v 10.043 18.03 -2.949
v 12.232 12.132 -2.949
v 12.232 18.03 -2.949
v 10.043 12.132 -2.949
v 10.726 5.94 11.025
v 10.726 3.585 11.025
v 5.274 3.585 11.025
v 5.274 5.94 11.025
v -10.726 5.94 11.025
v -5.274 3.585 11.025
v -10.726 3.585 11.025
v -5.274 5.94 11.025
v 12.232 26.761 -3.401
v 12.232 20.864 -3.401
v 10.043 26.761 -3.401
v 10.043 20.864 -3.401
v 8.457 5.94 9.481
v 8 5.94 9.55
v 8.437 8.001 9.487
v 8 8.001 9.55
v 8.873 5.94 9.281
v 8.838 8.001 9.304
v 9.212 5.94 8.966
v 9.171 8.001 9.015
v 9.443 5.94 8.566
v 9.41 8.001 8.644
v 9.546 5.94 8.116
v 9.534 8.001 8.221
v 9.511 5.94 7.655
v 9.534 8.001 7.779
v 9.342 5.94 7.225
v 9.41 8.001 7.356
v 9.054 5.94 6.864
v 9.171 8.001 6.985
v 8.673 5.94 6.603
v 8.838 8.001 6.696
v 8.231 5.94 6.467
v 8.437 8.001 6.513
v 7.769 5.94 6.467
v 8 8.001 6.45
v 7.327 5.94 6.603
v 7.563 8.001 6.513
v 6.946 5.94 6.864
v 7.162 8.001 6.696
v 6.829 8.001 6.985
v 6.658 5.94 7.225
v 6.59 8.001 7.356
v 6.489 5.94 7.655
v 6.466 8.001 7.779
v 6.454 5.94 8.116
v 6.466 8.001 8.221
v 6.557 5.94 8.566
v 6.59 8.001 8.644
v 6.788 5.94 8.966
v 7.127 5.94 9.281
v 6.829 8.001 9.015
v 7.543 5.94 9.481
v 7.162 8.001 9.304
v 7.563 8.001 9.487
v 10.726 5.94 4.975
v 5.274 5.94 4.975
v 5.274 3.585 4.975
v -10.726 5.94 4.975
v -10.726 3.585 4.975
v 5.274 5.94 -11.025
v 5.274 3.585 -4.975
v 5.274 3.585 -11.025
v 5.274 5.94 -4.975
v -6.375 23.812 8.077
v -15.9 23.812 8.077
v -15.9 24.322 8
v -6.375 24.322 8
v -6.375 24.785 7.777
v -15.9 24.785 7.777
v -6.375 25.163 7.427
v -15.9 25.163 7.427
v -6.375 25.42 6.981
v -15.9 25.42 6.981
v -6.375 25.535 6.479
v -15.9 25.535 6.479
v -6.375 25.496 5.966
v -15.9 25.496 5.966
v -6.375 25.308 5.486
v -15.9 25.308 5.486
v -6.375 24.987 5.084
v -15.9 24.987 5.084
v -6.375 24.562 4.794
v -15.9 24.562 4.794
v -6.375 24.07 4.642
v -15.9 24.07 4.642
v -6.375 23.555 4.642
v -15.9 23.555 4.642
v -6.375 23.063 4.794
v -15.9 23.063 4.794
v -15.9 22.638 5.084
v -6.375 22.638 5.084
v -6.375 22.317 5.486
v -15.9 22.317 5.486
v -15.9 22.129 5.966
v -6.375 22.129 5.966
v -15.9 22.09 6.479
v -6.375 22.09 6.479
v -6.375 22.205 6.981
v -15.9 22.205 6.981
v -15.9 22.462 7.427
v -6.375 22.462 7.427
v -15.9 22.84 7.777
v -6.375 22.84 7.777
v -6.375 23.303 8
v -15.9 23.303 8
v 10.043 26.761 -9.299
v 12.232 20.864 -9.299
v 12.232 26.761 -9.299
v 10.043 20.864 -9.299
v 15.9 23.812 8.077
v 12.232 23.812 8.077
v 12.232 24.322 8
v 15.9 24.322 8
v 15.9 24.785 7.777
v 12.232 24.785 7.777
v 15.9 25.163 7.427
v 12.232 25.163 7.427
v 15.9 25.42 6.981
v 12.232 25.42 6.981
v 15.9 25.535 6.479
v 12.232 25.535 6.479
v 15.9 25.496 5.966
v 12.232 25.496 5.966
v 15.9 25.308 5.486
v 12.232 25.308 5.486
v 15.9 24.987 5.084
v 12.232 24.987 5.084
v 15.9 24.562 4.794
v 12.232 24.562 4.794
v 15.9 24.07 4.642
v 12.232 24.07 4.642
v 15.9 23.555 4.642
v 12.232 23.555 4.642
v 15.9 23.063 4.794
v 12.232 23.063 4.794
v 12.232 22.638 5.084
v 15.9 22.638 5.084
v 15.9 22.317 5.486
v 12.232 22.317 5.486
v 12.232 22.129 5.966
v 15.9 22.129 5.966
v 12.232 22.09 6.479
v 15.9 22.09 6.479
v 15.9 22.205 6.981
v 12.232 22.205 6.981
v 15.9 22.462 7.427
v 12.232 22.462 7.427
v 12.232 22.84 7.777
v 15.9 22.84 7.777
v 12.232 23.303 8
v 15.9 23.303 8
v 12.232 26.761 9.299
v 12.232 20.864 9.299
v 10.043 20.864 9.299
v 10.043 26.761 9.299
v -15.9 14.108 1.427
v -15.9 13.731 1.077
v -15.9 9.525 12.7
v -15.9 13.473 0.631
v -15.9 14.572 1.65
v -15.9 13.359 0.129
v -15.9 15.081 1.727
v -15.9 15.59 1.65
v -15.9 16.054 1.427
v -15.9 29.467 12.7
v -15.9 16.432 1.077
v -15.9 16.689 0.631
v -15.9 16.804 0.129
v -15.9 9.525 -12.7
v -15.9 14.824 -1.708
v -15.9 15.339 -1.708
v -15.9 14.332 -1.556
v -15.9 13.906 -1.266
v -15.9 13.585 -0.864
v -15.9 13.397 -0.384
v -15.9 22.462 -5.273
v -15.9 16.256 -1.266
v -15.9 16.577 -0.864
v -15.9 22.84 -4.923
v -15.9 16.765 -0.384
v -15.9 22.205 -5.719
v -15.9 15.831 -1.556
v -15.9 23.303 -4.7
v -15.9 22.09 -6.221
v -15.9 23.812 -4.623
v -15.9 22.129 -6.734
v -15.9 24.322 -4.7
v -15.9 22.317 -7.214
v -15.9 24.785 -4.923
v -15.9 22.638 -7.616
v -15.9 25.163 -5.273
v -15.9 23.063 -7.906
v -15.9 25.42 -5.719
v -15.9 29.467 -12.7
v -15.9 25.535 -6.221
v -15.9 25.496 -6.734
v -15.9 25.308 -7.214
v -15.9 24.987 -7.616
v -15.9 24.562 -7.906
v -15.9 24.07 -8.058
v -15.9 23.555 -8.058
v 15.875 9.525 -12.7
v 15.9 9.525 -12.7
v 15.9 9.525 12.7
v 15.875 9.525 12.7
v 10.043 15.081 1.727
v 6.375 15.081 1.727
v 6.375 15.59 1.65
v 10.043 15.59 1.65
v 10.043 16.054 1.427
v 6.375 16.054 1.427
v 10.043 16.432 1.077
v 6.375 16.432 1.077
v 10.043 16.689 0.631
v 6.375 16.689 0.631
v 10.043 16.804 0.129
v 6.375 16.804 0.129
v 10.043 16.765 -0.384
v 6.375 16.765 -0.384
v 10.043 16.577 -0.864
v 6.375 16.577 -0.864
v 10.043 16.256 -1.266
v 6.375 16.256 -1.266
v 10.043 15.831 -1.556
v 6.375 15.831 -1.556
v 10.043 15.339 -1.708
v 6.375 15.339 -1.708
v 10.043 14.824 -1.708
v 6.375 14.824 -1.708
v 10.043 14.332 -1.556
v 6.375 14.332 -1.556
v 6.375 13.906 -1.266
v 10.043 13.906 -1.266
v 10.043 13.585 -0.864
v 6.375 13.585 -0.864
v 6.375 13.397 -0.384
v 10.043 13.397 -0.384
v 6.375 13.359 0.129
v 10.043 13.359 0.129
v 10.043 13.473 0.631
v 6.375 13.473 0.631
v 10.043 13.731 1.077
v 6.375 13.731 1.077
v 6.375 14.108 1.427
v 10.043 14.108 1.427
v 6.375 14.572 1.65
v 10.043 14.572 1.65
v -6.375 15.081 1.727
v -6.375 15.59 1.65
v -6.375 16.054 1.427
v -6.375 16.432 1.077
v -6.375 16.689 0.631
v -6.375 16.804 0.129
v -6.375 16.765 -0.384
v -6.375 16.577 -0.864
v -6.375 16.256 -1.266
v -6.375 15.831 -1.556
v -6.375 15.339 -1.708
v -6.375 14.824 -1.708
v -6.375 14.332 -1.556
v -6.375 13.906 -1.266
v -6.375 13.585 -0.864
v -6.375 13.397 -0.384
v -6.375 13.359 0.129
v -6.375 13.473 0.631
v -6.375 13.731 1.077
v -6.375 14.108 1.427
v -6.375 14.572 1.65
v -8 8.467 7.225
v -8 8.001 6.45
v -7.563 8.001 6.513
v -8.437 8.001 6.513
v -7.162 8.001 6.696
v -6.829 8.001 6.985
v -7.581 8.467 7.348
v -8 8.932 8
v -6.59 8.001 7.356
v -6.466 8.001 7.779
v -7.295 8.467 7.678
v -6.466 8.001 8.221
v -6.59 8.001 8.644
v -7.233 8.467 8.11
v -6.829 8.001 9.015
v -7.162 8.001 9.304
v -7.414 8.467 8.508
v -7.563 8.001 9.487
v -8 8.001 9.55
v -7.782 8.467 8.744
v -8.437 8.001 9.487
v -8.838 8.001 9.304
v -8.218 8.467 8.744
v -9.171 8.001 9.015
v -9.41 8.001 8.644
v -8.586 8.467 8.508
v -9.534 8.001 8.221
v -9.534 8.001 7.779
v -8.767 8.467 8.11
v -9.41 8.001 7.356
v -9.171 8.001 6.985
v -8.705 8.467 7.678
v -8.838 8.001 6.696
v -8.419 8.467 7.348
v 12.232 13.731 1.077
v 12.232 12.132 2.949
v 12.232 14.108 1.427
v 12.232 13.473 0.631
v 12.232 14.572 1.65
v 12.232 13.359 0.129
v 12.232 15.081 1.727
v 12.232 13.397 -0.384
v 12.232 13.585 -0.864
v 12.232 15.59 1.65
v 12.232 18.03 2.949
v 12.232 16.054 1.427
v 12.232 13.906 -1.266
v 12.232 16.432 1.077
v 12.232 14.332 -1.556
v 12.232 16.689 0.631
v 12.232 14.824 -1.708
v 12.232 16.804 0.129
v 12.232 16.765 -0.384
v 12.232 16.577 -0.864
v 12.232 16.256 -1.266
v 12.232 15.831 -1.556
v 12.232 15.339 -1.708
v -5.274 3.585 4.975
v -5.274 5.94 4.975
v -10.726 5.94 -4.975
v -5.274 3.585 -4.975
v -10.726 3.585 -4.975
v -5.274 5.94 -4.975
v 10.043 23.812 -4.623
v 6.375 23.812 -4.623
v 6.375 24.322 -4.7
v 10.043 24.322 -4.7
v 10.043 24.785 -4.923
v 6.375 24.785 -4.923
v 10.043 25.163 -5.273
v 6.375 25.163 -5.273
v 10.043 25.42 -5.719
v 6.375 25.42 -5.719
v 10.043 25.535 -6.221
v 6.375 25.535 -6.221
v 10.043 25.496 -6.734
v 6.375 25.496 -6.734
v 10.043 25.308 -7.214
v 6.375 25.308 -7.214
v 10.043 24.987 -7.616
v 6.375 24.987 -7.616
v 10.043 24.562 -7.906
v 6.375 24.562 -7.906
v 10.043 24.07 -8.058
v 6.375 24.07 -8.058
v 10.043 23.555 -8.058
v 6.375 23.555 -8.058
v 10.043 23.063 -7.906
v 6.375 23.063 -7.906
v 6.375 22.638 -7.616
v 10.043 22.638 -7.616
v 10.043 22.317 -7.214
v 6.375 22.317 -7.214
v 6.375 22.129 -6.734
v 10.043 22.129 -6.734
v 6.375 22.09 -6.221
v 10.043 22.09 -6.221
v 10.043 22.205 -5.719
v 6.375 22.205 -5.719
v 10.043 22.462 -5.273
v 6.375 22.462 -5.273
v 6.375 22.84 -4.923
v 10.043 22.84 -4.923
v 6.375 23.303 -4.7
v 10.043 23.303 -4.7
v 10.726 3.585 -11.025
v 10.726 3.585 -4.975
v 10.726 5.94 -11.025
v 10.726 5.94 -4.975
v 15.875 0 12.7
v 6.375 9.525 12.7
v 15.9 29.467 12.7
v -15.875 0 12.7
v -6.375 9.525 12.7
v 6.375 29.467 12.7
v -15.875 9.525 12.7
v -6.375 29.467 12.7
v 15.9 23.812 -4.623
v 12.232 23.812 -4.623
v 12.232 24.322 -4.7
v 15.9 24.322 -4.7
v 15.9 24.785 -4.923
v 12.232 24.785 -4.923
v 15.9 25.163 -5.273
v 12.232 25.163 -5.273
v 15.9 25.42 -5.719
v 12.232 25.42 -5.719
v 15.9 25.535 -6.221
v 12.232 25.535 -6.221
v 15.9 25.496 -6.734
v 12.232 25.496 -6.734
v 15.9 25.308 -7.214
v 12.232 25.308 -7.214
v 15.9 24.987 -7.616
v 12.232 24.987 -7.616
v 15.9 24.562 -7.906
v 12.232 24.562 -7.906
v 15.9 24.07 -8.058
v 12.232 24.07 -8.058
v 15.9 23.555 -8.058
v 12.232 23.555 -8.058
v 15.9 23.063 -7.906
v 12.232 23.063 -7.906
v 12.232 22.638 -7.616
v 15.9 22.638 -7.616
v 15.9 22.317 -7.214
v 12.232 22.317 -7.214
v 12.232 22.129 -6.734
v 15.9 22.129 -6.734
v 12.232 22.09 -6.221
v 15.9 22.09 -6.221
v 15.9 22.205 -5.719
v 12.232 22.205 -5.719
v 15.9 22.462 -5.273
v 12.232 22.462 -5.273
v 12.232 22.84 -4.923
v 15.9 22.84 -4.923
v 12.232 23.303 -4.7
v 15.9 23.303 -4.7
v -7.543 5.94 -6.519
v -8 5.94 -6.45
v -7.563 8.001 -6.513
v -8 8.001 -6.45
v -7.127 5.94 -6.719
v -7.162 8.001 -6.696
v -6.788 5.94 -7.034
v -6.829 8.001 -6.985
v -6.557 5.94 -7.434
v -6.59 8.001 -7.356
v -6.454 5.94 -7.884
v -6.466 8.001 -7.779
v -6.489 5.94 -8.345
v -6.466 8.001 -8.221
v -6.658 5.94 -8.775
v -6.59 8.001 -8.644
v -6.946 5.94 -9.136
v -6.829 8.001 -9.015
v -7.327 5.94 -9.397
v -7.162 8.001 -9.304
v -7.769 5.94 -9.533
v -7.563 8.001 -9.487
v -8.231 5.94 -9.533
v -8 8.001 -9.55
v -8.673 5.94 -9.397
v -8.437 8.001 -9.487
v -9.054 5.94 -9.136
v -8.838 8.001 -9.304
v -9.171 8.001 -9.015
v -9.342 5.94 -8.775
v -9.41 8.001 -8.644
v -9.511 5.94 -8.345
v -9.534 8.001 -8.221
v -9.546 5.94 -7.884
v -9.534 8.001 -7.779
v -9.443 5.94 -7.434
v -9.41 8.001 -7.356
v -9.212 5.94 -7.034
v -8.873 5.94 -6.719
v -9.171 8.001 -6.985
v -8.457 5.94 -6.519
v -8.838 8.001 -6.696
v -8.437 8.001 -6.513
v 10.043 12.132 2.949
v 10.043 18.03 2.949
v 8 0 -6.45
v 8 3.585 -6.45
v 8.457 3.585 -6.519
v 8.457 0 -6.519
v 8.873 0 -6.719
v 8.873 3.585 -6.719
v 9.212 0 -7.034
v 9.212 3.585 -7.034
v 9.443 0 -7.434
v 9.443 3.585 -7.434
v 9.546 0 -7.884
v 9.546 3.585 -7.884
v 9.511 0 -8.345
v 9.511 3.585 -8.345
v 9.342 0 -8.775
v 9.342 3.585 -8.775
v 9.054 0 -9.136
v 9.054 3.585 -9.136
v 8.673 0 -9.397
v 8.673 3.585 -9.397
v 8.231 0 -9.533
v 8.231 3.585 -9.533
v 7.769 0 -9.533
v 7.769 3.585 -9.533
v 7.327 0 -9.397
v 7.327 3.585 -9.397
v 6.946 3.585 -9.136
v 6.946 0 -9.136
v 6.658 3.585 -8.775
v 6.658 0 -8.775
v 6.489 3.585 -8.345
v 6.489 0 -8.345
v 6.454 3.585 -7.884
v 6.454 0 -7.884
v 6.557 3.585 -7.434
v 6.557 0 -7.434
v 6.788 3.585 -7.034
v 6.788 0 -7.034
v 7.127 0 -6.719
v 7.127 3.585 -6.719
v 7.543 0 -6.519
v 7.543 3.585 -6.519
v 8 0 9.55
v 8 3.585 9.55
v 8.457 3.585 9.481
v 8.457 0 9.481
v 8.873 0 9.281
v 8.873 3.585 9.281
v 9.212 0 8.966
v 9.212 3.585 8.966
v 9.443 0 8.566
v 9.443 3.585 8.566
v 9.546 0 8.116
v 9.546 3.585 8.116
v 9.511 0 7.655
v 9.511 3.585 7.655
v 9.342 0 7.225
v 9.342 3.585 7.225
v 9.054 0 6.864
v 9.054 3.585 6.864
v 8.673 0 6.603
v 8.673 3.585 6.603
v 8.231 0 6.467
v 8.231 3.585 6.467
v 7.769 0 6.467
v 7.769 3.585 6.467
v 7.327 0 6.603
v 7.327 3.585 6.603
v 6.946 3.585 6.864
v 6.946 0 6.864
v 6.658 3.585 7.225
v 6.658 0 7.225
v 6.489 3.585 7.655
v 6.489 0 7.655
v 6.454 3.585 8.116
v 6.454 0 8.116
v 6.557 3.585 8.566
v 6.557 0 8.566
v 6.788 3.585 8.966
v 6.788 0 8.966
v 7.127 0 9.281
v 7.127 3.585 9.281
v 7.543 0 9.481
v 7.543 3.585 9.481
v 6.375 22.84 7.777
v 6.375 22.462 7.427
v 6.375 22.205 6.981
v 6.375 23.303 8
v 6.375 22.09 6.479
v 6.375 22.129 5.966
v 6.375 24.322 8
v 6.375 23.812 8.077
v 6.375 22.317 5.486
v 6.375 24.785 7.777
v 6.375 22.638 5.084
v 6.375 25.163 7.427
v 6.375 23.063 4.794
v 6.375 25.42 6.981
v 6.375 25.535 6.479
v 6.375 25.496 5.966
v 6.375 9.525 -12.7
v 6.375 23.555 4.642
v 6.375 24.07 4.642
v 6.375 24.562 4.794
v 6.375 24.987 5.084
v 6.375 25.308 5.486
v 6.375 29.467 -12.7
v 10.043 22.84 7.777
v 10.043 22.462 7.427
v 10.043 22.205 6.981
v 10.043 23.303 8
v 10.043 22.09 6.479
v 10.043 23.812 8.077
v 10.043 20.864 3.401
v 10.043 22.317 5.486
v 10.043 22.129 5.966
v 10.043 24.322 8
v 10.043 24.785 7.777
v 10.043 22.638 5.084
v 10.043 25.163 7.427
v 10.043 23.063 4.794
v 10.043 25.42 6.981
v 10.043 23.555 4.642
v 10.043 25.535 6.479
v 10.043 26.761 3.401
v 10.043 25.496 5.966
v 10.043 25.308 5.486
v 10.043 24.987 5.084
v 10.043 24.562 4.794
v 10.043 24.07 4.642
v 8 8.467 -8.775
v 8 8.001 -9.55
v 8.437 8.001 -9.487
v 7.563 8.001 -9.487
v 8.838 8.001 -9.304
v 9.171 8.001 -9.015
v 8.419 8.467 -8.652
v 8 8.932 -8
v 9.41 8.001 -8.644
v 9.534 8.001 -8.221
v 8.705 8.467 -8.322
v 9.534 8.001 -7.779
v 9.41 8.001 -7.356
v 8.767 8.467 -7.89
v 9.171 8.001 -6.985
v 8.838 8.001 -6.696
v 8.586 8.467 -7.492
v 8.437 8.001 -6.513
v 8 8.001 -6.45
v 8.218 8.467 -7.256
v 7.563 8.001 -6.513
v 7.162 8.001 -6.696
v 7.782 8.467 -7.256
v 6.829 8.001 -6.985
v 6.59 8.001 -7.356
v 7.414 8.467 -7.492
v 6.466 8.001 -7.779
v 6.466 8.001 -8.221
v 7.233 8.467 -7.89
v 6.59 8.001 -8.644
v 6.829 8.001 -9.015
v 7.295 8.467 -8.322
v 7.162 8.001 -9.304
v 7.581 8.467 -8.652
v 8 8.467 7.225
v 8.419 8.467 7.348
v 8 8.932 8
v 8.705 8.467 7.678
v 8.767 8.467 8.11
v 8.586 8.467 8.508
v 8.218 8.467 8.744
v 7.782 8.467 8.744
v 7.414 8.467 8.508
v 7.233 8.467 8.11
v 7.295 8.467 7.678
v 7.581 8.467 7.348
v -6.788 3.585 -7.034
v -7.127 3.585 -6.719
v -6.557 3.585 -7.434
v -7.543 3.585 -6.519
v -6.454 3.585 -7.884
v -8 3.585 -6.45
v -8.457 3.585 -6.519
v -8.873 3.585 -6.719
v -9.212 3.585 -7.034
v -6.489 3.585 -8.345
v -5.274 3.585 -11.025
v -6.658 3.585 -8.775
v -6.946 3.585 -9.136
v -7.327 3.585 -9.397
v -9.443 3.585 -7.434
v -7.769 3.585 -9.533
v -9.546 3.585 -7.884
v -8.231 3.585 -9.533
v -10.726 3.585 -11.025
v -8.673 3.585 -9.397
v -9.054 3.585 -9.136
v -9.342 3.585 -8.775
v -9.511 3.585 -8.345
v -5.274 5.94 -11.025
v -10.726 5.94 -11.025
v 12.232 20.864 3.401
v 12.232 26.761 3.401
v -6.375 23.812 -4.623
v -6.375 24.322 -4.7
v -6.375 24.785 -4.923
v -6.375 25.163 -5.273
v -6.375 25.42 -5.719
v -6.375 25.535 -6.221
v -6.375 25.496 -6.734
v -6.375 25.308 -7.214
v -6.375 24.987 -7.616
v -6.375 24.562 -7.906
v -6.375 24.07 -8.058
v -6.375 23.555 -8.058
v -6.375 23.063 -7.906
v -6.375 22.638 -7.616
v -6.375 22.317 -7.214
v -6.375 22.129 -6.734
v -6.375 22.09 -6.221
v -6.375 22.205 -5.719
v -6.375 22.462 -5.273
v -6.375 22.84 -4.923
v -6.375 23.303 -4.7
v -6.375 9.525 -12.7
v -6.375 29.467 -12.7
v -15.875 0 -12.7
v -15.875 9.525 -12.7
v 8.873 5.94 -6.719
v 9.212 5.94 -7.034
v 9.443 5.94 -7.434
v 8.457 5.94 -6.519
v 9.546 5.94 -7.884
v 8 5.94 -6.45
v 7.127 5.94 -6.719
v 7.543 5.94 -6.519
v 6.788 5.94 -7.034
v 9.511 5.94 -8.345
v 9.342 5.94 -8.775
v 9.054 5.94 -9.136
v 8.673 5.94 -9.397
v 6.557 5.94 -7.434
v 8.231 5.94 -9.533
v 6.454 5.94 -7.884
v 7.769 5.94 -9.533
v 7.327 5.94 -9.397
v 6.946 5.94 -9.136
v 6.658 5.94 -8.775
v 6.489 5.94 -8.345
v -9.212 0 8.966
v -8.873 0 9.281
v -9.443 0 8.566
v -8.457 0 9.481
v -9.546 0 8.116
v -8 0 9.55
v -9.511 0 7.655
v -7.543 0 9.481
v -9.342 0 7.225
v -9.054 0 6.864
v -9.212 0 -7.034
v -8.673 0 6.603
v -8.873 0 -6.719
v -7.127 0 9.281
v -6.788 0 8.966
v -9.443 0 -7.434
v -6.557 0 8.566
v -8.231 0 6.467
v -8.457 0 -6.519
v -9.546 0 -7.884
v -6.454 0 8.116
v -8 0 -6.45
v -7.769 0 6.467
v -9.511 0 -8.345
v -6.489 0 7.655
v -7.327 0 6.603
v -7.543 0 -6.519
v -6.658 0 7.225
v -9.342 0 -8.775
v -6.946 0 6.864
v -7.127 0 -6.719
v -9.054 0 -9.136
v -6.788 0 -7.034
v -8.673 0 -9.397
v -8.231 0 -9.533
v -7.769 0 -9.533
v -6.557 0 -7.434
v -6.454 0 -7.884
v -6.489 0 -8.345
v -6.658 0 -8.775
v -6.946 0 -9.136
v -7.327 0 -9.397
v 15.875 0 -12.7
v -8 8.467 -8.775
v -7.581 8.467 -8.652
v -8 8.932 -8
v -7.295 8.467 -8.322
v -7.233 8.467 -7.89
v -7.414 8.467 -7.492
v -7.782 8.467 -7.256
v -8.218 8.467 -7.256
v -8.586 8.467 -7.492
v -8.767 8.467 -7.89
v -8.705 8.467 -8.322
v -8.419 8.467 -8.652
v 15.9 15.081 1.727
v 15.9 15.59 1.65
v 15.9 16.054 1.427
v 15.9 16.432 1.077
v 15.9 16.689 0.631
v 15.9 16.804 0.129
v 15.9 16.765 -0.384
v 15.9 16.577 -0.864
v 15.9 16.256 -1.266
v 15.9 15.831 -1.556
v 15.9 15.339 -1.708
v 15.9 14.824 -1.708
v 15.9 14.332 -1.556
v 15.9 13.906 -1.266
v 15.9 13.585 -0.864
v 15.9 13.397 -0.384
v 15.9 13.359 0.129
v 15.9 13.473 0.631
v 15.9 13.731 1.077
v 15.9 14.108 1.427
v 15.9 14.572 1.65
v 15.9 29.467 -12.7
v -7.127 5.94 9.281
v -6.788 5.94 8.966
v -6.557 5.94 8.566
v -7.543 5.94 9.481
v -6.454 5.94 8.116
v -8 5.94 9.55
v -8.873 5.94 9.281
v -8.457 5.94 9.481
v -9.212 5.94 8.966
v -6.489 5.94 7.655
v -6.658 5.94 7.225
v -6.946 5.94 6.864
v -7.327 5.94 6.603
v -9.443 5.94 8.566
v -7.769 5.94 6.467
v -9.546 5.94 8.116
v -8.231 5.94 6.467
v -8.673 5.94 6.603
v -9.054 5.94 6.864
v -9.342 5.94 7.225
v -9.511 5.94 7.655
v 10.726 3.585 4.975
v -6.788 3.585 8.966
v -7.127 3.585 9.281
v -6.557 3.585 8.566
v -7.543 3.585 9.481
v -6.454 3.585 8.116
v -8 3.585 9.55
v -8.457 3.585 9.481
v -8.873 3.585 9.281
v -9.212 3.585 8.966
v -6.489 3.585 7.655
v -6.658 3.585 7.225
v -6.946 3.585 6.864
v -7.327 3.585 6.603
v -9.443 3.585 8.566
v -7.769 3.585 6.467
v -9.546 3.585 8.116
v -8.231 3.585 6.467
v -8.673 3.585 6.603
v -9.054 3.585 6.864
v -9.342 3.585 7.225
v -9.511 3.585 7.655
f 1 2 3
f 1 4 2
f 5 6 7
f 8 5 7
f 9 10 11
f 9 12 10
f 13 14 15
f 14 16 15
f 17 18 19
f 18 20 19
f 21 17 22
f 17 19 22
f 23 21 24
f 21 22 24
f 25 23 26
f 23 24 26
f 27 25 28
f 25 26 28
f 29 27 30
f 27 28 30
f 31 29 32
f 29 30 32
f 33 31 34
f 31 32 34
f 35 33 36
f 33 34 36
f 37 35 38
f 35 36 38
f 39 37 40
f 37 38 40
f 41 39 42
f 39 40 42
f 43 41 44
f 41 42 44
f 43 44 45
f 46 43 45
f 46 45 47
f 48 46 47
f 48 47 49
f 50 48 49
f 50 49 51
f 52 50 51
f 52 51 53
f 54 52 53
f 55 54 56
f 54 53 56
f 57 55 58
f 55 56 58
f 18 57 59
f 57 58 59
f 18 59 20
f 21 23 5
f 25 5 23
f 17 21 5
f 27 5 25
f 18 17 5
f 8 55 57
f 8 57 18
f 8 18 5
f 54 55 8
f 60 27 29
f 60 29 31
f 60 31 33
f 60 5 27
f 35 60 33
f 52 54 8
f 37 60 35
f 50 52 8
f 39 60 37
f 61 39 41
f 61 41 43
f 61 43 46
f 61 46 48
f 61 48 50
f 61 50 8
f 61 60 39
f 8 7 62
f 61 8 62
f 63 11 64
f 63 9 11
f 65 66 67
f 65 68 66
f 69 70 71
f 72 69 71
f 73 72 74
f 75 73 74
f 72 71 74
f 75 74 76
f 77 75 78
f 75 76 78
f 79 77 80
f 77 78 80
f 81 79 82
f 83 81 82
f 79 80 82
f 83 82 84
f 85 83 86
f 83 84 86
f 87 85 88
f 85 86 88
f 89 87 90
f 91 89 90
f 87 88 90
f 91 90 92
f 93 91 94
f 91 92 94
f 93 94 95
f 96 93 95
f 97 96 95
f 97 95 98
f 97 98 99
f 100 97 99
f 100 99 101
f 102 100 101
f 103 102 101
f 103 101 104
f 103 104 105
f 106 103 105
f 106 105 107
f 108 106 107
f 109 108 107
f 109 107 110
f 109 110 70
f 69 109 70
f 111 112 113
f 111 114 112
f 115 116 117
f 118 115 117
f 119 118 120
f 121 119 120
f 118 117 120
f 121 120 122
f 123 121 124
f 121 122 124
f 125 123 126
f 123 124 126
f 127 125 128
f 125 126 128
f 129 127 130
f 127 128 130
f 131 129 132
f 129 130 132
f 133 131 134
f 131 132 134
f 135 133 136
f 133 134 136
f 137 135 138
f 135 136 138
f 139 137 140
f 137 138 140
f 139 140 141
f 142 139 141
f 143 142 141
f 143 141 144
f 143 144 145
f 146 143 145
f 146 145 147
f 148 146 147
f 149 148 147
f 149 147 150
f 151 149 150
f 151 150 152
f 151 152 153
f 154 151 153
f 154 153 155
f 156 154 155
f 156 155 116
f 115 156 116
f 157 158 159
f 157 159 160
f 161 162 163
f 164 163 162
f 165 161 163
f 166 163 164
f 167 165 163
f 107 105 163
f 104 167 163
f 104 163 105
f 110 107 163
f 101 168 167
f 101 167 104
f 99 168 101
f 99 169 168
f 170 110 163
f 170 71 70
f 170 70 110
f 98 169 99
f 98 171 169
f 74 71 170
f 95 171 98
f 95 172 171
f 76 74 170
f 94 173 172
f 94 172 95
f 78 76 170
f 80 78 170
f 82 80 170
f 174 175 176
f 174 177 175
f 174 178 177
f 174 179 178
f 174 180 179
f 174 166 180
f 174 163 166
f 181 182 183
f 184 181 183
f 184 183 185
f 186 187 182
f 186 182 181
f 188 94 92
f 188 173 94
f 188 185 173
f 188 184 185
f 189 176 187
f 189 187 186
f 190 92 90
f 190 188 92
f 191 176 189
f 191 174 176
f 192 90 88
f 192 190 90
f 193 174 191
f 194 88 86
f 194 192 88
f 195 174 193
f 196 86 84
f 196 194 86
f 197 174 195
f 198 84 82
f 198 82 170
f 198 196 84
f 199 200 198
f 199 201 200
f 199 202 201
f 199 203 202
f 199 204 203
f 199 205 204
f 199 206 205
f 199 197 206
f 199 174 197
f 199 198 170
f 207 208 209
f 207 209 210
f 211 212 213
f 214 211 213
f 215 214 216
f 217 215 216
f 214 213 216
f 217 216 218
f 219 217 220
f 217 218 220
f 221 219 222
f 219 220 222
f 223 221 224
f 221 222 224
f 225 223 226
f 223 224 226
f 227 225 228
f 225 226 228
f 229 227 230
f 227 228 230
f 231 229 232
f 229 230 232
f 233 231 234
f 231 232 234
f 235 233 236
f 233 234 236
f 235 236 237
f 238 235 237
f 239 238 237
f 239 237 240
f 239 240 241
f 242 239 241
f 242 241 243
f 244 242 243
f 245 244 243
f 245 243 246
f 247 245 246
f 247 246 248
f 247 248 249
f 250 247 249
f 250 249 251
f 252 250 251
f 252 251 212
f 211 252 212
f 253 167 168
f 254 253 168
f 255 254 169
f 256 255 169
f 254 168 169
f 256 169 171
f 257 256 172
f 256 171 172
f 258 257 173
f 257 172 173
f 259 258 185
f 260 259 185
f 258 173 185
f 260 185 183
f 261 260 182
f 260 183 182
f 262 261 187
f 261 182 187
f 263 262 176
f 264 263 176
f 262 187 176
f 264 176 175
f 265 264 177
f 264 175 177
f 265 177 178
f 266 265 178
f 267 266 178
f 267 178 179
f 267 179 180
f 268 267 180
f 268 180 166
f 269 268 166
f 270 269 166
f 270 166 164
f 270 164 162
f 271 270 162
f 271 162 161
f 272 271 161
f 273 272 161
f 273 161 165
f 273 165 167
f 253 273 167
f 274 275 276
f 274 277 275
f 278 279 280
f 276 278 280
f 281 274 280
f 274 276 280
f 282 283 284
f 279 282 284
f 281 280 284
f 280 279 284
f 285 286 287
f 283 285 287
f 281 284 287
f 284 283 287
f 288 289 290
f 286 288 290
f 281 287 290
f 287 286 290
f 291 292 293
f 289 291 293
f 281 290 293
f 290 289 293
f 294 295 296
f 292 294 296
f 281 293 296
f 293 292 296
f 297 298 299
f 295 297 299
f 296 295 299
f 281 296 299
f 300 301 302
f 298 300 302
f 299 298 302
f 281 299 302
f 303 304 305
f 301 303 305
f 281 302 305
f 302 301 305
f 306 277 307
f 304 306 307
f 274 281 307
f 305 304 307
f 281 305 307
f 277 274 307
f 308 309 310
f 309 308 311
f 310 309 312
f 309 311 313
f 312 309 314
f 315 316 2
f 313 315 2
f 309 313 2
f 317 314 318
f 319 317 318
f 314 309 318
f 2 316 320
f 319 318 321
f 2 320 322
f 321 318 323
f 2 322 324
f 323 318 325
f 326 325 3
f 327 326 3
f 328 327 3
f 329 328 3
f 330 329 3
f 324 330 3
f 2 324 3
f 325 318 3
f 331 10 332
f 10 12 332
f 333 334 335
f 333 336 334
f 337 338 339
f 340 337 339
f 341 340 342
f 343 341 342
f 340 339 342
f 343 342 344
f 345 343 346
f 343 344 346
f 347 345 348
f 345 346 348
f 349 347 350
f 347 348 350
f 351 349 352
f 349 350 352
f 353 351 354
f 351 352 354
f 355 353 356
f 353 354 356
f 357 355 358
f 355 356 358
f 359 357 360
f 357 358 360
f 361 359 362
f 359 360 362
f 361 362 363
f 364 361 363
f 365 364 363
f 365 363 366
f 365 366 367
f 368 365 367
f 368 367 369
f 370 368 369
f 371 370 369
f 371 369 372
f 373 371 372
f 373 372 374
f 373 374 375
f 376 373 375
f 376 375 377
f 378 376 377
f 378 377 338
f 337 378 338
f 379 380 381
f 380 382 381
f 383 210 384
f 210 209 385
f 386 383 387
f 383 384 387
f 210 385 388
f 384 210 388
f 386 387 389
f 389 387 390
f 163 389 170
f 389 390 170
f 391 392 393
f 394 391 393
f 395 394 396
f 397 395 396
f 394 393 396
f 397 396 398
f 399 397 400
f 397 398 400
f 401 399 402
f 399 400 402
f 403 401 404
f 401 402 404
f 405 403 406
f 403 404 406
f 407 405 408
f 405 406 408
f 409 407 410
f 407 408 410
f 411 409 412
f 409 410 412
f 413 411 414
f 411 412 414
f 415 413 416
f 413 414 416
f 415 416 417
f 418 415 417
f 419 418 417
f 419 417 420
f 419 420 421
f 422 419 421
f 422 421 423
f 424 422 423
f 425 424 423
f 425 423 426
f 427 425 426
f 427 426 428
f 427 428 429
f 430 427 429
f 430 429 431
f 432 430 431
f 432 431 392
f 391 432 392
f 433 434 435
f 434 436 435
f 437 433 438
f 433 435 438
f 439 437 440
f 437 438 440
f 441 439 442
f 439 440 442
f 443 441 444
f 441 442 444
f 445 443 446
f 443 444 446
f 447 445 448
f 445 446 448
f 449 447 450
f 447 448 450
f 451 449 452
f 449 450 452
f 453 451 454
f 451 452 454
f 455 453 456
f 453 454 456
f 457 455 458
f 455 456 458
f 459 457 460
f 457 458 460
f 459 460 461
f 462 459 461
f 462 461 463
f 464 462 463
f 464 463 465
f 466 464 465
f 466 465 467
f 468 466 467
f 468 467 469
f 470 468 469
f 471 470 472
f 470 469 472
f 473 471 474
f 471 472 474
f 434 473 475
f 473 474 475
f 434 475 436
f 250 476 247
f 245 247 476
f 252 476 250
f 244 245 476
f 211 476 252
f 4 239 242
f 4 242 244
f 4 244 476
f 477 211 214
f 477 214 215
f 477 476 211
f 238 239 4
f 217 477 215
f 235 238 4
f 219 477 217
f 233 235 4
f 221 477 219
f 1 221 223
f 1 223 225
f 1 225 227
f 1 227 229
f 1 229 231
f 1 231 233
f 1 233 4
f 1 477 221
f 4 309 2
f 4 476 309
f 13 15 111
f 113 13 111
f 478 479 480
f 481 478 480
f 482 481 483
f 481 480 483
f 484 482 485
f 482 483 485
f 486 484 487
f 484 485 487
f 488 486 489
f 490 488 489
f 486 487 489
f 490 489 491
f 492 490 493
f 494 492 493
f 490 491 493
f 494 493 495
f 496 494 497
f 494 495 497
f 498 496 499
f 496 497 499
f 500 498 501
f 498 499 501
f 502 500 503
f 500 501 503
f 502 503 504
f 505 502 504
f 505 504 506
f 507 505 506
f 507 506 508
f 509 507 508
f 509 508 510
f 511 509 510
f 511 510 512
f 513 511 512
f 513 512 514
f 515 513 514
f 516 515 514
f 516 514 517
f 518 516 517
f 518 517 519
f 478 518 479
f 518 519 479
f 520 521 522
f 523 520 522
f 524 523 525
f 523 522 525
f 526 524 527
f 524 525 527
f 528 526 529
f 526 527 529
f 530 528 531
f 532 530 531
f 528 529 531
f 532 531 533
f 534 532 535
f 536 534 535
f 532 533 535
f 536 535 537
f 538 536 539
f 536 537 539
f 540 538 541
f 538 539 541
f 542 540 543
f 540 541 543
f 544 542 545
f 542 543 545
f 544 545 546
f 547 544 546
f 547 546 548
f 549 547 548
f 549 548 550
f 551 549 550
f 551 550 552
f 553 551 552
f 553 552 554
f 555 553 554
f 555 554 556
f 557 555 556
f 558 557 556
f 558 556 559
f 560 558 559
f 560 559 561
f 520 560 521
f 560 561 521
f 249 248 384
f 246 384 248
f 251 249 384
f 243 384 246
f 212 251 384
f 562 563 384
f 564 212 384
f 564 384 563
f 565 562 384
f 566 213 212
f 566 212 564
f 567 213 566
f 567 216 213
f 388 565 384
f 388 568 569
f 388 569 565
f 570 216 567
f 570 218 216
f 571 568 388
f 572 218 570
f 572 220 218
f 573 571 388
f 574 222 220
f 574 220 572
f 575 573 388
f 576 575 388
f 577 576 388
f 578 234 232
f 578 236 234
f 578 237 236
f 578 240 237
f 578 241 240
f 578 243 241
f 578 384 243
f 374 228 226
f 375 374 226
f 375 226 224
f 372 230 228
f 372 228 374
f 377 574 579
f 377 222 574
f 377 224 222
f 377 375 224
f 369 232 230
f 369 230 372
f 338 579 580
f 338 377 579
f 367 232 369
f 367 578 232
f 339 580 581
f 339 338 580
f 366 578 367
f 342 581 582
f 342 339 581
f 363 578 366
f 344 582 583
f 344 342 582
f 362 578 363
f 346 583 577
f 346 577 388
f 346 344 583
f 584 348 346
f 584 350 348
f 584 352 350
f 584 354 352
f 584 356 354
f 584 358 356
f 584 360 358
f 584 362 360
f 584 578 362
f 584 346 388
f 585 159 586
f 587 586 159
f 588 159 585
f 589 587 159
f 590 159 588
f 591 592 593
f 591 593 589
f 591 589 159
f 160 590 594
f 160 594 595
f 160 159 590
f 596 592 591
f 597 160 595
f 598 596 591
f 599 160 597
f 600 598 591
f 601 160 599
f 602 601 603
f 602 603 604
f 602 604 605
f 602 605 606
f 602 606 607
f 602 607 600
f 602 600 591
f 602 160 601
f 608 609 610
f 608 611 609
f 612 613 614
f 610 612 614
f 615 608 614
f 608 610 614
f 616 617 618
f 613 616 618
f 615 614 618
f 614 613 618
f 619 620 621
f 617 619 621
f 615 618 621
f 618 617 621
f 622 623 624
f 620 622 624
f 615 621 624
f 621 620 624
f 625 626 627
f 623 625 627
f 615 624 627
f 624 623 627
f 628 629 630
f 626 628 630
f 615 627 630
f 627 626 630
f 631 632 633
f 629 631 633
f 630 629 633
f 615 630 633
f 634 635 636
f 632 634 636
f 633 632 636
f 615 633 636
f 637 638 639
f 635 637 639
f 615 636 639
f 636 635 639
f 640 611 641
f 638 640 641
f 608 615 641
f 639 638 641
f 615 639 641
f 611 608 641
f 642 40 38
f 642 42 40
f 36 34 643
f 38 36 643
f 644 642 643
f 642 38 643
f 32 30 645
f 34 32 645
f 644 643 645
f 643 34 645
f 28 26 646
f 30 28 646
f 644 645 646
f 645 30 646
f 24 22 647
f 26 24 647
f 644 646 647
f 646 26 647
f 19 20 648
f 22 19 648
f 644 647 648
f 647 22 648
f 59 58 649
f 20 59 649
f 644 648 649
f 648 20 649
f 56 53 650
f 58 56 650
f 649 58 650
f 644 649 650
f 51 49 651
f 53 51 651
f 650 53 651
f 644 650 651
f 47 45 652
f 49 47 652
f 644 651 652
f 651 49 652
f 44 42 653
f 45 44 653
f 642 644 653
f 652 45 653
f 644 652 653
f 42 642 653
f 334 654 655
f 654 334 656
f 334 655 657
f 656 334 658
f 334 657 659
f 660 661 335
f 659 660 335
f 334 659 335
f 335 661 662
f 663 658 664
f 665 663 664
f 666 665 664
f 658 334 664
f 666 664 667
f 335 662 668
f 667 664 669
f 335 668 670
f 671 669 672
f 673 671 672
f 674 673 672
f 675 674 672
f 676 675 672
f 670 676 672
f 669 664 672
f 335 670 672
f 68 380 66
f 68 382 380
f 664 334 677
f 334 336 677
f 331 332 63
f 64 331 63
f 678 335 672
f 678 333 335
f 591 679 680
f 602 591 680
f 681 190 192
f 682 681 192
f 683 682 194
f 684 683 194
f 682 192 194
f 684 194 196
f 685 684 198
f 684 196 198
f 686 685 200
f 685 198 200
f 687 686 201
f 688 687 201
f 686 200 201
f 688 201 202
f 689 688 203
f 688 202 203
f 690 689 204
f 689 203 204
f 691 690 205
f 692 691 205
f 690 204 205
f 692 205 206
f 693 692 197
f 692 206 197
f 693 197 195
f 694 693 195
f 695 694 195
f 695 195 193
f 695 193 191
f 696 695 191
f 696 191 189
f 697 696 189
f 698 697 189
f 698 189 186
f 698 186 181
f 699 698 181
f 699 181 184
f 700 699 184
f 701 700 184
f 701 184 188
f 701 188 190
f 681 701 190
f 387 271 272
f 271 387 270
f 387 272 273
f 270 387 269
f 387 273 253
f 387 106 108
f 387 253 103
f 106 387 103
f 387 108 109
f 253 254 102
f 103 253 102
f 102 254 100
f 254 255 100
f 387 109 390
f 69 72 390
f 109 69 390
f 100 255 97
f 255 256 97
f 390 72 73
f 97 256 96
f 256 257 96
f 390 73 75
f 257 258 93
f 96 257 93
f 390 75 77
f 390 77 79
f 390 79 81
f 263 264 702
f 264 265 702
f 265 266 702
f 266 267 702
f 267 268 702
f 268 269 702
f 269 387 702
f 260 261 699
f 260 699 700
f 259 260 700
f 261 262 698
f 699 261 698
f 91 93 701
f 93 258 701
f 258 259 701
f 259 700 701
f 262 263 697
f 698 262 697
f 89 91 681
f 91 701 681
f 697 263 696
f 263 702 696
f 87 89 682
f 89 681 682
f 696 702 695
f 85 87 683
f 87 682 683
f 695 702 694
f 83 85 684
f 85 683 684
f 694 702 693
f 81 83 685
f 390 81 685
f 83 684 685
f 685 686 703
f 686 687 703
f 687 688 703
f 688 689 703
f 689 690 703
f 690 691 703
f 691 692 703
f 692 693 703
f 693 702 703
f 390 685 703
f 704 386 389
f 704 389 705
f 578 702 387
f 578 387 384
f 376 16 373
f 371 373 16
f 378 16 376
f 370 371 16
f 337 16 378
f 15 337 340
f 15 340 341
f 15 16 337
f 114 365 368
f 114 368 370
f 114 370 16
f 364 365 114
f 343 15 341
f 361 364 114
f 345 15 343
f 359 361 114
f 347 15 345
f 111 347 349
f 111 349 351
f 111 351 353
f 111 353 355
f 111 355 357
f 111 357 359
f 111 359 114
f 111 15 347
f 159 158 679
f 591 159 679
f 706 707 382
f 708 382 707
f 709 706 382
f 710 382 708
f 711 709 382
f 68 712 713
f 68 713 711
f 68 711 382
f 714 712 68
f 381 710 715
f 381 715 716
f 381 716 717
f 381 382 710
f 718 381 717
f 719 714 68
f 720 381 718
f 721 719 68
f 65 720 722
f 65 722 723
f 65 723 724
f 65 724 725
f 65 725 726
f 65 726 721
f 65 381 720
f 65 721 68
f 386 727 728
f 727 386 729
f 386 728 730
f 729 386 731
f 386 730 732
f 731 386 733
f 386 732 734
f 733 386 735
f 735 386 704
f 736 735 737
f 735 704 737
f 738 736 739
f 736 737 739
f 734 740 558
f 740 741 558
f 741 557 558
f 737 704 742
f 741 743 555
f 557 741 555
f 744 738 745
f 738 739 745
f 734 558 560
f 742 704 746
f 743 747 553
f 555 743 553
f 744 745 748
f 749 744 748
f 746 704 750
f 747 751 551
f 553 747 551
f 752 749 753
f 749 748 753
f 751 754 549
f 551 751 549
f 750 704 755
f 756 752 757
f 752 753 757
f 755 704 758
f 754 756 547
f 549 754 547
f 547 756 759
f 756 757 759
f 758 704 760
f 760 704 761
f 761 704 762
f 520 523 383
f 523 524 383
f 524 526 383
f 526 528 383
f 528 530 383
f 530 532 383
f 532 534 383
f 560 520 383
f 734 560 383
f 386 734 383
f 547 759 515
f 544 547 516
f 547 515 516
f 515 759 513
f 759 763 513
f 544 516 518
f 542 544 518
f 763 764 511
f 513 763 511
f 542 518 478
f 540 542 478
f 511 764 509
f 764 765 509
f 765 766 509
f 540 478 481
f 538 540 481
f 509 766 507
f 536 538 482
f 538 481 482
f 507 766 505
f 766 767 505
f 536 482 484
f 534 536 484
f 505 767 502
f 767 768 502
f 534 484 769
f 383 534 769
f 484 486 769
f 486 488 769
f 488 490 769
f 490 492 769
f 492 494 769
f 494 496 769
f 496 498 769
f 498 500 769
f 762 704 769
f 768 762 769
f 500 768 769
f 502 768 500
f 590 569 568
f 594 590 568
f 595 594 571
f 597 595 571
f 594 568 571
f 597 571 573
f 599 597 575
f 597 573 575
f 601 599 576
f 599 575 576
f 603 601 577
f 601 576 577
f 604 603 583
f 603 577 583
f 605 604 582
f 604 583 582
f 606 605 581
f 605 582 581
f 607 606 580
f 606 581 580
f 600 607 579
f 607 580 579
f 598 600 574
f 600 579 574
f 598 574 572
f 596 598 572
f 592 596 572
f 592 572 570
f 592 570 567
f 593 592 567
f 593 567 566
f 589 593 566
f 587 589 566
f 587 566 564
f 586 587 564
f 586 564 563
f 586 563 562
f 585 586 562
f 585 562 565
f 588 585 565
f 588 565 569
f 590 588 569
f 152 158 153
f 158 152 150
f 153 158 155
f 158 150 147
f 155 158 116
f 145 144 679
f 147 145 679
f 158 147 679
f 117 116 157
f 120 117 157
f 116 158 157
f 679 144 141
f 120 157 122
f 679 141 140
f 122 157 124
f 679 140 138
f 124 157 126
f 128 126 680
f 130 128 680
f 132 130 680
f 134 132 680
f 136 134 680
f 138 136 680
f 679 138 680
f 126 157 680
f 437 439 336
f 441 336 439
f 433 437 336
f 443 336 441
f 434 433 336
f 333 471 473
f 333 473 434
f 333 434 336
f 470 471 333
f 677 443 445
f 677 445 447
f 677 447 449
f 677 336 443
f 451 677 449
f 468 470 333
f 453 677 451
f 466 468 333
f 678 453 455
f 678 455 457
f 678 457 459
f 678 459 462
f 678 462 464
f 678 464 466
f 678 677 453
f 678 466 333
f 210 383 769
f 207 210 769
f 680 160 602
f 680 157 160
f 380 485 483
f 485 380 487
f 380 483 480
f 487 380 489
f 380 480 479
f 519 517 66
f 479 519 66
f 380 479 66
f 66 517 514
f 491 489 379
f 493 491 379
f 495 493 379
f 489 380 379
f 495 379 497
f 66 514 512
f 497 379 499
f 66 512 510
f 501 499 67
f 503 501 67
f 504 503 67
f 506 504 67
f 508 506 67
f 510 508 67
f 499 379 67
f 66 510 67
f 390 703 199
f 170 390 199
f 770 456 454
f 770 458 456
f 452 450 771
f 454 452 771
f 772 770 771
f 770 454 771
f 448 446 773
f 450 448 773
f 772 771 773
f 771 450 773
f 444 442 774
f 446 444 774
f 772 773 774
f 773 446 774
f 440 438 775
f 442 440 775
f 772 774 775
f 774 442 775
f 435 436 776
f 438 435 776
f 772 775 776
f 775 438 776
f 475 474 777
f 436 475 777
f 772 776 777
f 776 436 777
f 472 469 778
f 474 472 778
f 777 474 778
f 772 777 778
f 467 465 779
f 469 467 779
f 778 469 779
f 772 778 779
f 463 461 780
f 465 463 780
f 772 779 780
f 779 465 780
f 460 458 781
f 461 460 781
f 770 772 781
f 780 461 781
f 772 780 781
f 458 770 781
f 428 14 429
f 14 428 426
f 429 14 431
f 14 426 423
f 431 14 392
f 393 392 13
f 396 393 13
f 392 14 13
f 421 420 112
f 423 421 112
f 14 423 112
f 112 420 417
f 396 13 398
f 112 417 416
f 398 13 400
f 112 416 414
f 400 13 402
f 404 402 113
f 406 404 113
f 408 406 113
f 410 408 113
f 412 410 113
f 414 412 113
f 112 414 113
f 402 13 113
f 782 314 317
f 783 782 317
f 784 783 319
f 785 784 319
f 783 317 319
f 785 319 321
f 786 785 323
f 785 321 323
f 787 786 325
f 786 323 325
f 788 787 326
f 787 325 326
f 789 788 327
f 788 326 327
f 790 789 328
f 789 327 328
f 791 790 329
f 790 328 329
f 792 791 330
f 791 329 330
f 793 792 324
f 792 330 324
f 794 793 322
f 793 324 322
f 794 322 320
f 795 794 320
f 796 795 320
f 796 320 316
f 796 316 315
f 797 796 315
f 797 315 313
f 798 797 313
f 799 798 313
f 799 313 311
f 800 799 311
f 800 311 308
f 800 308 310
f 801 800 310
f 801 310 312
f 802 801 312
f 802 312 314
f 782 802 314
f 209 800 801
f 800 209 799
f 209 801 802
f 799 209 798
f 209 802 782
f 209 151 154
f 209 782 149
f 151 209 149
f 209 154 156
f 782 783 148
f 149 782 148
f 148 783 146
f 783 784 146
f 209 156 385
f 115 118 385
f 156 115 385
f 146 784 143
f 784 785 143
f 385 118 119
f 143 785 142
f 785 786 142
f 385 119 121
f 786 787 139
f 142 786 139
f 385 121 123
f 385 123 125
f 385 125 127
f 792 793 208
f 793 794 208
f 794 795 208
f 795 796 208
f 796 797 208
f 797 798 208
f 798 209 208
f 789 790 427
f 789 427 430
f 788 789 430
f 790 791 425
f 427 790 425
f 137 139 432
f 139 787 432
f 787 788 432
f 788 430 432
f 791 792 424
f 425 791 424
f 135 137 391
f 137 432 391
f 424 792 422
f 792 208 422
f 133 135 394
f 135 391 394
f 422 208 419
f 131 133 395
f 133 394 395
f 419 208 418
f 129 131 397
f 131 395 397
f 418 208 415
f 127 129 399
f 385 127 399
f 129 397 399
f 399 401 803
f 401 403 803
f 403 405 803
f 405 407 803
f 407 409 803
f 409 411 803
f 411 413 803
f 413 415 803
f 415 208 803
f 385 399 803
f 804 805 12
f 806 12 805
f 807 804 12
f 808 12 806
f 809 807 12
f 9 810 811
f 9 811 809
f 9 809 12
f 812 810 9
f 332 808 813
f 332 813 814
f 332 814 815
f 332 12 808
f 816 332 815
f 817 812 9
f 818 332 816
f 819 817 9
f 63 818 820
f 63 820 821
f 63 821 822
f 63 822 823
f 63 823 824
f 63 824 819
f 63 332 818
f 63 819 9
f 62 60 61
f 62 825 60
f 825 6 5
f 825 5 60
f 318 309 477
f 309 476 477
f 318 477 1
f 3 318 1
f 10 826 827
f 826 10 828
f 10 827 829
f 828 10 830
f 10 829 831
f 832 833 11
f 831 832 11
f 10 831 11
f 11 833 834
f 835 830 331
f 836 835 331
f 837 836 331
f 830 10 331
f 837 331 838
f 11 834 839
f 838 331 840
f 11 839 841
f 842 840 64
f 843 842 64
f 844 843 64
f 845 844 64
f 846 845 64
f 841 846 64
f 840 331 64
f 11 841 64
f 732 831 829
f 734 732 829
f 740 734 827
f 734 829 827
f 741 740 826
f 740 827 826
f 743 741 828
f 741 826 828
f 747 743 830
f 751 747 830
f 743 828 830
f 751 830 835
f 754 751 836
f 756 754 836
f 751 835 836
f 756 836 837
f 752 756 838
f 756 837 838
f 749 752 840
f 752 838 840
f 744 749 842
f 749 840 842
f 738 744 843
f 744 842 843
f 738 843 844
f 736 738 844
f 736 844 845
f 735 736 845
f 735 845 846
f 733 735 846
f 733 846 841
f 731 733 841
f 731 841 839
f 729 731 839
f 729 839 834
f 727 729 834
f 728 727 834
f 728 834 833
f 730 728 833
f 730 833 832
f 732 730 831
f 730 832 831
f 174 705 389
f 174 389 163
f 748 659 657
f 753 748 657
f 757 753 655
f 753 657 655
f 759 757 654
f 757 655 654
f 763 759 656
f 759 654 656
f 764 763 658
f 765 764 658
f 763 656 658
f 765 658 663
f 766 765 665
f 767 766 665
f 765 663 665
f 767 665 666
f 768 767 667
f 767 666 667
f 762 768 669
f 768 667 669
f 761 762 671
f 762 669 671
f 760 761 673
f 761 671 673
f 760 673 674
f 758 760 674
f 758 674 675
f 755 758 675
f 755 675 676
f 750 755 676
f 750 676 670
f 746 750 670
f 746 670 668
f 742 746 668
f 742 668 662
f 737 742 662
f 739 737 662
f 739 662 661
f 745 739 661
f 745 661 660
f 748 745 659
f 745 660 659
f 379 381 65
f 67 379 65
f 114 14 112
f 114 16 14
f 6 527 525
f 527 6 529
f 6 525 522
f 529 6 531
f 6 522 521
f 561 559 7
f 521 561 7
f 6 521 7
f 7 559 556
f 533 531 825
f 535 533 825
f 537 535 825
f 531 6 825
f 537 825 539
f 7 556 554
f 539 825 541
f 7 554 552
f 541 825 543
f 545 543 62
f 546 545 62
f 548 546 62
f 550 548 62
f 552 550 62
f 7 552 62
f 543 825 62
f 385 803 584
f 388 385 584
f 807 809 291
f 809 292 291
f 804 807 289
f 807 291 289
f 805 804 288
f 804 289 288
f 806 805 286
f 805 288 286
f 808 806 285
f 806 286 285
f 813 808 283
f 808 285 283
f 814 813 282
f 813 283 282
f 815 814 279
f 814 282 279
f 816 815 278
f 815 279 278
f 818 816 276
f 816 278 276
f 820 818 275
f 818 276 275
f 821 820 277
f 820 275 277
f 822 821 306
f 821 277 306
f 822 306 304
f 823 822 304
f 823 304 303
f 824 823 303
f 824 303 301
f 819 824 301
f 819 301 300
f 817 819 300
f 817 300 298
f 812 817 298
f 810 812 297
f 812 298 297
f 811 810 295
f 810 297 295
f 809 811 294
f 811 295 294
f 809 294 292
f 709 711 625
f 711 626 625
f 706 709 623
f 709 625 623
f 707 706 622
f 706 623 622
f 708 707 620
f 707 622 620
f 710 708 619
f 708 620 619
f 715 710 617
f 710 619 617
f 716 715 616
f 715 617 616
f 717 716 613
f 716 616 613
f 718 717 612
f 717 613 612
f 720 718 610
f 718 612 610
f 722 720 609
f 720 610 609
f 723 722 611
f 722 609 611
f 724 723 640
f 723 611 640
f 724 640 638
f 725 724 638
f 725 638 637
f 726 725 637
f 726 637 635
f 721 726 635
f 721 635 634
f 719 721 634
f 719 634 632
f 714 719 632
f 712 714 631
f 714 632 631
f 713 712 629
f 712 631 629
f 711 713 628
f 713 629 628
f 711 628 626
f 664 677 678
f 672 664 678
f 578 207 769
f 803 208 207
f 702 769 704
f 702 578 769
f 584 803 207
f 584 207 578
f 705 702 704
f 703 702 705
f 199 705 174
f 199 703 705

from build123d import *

# Parameters (mm, degrees)
SKETCH1_W                  = 31.75
SKETCH1_H                  = 25.4
BOSS_EXTRUDE1_DEPTH        = 9.525
M2_5_CLEARANCE_HOLE1_D     = 3.1
M2_5_CLEARANCE_HOLE1_DEPTH = 8.001
M2_5_CLEARANCE_HOLE1_TIP   = 0.931333959
SKETCH3_W                  = 9.525
SKETCH3_H                  = 19.942491079
BOSS_EXTRUDE2_DEPTH        = 25.4
F_4_CLEARANCE_HOLE1_D      = 3.4544
SKETCH9_W                  = 5.8975
SKETCH9_H                  = 5.8975
CUT_EXTRUDE1_DEPTH         = 1.09455
SKETCH10_W                 = 5.453
SKETCH10_H                 = 6.0499
CUT_EXTRUDE2_DEPTH         = 1.1771


with BuildPart() as part:
    # Sketch1 → Boss-Extrude1 (new body)
    with BuildSketch(Plane(origin=(0, 0, 0), x_dir=(1, 0, 0), z_dir=(0, 1, 0))):
        Rectangle(SKETCH1_W, SKETCH1_H)
    extrude(amount=BOSS_EXTRUDE1_DEPTH)

    # M2.5 Clearance Hole1
    with Locations(Plane(origin=(8, 0, -8), x_dir=(0, 0, -1), z_dir=(0, -1, 0))):
        with Locations((0, 0), (-16, 0), (-16, -16), (0, -16)):
            Hole(M2_5_CLEARANCE_HOLE1_D / 2, depth=M2_5_CLEARANCE_HOLE1_DEPTH)
            with Locations((0, 0, -(M2_5_CLEARANCE_HOLE1_DEPTH + M2_5_CLEARANCE_HOLE1_TIP / 2))):  # 118° drill point
                Cone(0, M2_5_CLEARANCE_HOLE1_D / 2, M2_5_CLEARANCE_HOLE1_TIP, mode=Mode.SUBTRACT)

    # Sketch3 → Boss-Extrude2 (add)
    with BuildSketch(Plane(origin=(0, 0, -12.7), x_dir=(-1, 0, 0), z_dir=(0, 0, -1))):
        with Locations((11.1379, 19.49624554)):
            Rectangle(SKETCH3_W, SKETCH3_H)
        with Locations((-11.1379, 19.49624554)):
            Rectangle(SKETCH3_W, SKETCH3_H)
    extrude(amount=-BOSS_EXTRUDE2_DEPTH)

    # #4 Clearance Hole1 (through all)
    with Locations(Plane(origin=(15.9004, 0, 0), x_dir=(0, 0, -1), z_dir=(1, 0, 0))):
        with Locations((0, 15.08125), (6.35, 23.8125), (-6.35, 23.8125)):
            Hole(F_4_CLEARANCE_HOLE1_D / 2)

    # Sketch9 → Cut-Extrude1 (cut, symmetric)
    with BuildSketch(Plane(origin=(11.1379, 0, 0), x_dir=(0, 0, -1), z_dir=(1, 0, 0))):
        with Locations((6.35, 23.8125)):
            Rectangle(SKETCH9_W, SKETCH9_H)
        with Locations((0, 15.08125)):
            Rectangle(SKETCH9_W, SKETCH9_H)
        with Locations((-6.35, 23.8125)):
            Rectangle(SKETCH9_W, SKETCH9_H)
    extrude(amount=CUT_EXTRUDE1_DEPTH, both=True, mode=Mode.SUBTRACT)

    # Sketch10 → Cut-Extrude2 (cut, symmetric)
    with BuildSketch(Plane(origin=(0, 4.7625, 0), x_dir=(-1, 0, 0), z_dir=(0, -1, 0))):
        with Locations((-8, 8)):
            Rectangle(SKETCH10_W, SKETCH10_H)
        with Locations((8, 8)):
            Rectangle(SKETCH10_W, SKETCH10_H)
        with Locations((8, -8)):
            Rectangle(SKETCH10_W, SKETCH10_H)
        with Locations((-8, -8)):
            Rectangle(SKETCH10_W, SKETCH10_H)
    extrude(amount=CUT_EXTRUDE2_DEPTH, both=True, mode=Mode.SUBTRACT)


solid = part.part
